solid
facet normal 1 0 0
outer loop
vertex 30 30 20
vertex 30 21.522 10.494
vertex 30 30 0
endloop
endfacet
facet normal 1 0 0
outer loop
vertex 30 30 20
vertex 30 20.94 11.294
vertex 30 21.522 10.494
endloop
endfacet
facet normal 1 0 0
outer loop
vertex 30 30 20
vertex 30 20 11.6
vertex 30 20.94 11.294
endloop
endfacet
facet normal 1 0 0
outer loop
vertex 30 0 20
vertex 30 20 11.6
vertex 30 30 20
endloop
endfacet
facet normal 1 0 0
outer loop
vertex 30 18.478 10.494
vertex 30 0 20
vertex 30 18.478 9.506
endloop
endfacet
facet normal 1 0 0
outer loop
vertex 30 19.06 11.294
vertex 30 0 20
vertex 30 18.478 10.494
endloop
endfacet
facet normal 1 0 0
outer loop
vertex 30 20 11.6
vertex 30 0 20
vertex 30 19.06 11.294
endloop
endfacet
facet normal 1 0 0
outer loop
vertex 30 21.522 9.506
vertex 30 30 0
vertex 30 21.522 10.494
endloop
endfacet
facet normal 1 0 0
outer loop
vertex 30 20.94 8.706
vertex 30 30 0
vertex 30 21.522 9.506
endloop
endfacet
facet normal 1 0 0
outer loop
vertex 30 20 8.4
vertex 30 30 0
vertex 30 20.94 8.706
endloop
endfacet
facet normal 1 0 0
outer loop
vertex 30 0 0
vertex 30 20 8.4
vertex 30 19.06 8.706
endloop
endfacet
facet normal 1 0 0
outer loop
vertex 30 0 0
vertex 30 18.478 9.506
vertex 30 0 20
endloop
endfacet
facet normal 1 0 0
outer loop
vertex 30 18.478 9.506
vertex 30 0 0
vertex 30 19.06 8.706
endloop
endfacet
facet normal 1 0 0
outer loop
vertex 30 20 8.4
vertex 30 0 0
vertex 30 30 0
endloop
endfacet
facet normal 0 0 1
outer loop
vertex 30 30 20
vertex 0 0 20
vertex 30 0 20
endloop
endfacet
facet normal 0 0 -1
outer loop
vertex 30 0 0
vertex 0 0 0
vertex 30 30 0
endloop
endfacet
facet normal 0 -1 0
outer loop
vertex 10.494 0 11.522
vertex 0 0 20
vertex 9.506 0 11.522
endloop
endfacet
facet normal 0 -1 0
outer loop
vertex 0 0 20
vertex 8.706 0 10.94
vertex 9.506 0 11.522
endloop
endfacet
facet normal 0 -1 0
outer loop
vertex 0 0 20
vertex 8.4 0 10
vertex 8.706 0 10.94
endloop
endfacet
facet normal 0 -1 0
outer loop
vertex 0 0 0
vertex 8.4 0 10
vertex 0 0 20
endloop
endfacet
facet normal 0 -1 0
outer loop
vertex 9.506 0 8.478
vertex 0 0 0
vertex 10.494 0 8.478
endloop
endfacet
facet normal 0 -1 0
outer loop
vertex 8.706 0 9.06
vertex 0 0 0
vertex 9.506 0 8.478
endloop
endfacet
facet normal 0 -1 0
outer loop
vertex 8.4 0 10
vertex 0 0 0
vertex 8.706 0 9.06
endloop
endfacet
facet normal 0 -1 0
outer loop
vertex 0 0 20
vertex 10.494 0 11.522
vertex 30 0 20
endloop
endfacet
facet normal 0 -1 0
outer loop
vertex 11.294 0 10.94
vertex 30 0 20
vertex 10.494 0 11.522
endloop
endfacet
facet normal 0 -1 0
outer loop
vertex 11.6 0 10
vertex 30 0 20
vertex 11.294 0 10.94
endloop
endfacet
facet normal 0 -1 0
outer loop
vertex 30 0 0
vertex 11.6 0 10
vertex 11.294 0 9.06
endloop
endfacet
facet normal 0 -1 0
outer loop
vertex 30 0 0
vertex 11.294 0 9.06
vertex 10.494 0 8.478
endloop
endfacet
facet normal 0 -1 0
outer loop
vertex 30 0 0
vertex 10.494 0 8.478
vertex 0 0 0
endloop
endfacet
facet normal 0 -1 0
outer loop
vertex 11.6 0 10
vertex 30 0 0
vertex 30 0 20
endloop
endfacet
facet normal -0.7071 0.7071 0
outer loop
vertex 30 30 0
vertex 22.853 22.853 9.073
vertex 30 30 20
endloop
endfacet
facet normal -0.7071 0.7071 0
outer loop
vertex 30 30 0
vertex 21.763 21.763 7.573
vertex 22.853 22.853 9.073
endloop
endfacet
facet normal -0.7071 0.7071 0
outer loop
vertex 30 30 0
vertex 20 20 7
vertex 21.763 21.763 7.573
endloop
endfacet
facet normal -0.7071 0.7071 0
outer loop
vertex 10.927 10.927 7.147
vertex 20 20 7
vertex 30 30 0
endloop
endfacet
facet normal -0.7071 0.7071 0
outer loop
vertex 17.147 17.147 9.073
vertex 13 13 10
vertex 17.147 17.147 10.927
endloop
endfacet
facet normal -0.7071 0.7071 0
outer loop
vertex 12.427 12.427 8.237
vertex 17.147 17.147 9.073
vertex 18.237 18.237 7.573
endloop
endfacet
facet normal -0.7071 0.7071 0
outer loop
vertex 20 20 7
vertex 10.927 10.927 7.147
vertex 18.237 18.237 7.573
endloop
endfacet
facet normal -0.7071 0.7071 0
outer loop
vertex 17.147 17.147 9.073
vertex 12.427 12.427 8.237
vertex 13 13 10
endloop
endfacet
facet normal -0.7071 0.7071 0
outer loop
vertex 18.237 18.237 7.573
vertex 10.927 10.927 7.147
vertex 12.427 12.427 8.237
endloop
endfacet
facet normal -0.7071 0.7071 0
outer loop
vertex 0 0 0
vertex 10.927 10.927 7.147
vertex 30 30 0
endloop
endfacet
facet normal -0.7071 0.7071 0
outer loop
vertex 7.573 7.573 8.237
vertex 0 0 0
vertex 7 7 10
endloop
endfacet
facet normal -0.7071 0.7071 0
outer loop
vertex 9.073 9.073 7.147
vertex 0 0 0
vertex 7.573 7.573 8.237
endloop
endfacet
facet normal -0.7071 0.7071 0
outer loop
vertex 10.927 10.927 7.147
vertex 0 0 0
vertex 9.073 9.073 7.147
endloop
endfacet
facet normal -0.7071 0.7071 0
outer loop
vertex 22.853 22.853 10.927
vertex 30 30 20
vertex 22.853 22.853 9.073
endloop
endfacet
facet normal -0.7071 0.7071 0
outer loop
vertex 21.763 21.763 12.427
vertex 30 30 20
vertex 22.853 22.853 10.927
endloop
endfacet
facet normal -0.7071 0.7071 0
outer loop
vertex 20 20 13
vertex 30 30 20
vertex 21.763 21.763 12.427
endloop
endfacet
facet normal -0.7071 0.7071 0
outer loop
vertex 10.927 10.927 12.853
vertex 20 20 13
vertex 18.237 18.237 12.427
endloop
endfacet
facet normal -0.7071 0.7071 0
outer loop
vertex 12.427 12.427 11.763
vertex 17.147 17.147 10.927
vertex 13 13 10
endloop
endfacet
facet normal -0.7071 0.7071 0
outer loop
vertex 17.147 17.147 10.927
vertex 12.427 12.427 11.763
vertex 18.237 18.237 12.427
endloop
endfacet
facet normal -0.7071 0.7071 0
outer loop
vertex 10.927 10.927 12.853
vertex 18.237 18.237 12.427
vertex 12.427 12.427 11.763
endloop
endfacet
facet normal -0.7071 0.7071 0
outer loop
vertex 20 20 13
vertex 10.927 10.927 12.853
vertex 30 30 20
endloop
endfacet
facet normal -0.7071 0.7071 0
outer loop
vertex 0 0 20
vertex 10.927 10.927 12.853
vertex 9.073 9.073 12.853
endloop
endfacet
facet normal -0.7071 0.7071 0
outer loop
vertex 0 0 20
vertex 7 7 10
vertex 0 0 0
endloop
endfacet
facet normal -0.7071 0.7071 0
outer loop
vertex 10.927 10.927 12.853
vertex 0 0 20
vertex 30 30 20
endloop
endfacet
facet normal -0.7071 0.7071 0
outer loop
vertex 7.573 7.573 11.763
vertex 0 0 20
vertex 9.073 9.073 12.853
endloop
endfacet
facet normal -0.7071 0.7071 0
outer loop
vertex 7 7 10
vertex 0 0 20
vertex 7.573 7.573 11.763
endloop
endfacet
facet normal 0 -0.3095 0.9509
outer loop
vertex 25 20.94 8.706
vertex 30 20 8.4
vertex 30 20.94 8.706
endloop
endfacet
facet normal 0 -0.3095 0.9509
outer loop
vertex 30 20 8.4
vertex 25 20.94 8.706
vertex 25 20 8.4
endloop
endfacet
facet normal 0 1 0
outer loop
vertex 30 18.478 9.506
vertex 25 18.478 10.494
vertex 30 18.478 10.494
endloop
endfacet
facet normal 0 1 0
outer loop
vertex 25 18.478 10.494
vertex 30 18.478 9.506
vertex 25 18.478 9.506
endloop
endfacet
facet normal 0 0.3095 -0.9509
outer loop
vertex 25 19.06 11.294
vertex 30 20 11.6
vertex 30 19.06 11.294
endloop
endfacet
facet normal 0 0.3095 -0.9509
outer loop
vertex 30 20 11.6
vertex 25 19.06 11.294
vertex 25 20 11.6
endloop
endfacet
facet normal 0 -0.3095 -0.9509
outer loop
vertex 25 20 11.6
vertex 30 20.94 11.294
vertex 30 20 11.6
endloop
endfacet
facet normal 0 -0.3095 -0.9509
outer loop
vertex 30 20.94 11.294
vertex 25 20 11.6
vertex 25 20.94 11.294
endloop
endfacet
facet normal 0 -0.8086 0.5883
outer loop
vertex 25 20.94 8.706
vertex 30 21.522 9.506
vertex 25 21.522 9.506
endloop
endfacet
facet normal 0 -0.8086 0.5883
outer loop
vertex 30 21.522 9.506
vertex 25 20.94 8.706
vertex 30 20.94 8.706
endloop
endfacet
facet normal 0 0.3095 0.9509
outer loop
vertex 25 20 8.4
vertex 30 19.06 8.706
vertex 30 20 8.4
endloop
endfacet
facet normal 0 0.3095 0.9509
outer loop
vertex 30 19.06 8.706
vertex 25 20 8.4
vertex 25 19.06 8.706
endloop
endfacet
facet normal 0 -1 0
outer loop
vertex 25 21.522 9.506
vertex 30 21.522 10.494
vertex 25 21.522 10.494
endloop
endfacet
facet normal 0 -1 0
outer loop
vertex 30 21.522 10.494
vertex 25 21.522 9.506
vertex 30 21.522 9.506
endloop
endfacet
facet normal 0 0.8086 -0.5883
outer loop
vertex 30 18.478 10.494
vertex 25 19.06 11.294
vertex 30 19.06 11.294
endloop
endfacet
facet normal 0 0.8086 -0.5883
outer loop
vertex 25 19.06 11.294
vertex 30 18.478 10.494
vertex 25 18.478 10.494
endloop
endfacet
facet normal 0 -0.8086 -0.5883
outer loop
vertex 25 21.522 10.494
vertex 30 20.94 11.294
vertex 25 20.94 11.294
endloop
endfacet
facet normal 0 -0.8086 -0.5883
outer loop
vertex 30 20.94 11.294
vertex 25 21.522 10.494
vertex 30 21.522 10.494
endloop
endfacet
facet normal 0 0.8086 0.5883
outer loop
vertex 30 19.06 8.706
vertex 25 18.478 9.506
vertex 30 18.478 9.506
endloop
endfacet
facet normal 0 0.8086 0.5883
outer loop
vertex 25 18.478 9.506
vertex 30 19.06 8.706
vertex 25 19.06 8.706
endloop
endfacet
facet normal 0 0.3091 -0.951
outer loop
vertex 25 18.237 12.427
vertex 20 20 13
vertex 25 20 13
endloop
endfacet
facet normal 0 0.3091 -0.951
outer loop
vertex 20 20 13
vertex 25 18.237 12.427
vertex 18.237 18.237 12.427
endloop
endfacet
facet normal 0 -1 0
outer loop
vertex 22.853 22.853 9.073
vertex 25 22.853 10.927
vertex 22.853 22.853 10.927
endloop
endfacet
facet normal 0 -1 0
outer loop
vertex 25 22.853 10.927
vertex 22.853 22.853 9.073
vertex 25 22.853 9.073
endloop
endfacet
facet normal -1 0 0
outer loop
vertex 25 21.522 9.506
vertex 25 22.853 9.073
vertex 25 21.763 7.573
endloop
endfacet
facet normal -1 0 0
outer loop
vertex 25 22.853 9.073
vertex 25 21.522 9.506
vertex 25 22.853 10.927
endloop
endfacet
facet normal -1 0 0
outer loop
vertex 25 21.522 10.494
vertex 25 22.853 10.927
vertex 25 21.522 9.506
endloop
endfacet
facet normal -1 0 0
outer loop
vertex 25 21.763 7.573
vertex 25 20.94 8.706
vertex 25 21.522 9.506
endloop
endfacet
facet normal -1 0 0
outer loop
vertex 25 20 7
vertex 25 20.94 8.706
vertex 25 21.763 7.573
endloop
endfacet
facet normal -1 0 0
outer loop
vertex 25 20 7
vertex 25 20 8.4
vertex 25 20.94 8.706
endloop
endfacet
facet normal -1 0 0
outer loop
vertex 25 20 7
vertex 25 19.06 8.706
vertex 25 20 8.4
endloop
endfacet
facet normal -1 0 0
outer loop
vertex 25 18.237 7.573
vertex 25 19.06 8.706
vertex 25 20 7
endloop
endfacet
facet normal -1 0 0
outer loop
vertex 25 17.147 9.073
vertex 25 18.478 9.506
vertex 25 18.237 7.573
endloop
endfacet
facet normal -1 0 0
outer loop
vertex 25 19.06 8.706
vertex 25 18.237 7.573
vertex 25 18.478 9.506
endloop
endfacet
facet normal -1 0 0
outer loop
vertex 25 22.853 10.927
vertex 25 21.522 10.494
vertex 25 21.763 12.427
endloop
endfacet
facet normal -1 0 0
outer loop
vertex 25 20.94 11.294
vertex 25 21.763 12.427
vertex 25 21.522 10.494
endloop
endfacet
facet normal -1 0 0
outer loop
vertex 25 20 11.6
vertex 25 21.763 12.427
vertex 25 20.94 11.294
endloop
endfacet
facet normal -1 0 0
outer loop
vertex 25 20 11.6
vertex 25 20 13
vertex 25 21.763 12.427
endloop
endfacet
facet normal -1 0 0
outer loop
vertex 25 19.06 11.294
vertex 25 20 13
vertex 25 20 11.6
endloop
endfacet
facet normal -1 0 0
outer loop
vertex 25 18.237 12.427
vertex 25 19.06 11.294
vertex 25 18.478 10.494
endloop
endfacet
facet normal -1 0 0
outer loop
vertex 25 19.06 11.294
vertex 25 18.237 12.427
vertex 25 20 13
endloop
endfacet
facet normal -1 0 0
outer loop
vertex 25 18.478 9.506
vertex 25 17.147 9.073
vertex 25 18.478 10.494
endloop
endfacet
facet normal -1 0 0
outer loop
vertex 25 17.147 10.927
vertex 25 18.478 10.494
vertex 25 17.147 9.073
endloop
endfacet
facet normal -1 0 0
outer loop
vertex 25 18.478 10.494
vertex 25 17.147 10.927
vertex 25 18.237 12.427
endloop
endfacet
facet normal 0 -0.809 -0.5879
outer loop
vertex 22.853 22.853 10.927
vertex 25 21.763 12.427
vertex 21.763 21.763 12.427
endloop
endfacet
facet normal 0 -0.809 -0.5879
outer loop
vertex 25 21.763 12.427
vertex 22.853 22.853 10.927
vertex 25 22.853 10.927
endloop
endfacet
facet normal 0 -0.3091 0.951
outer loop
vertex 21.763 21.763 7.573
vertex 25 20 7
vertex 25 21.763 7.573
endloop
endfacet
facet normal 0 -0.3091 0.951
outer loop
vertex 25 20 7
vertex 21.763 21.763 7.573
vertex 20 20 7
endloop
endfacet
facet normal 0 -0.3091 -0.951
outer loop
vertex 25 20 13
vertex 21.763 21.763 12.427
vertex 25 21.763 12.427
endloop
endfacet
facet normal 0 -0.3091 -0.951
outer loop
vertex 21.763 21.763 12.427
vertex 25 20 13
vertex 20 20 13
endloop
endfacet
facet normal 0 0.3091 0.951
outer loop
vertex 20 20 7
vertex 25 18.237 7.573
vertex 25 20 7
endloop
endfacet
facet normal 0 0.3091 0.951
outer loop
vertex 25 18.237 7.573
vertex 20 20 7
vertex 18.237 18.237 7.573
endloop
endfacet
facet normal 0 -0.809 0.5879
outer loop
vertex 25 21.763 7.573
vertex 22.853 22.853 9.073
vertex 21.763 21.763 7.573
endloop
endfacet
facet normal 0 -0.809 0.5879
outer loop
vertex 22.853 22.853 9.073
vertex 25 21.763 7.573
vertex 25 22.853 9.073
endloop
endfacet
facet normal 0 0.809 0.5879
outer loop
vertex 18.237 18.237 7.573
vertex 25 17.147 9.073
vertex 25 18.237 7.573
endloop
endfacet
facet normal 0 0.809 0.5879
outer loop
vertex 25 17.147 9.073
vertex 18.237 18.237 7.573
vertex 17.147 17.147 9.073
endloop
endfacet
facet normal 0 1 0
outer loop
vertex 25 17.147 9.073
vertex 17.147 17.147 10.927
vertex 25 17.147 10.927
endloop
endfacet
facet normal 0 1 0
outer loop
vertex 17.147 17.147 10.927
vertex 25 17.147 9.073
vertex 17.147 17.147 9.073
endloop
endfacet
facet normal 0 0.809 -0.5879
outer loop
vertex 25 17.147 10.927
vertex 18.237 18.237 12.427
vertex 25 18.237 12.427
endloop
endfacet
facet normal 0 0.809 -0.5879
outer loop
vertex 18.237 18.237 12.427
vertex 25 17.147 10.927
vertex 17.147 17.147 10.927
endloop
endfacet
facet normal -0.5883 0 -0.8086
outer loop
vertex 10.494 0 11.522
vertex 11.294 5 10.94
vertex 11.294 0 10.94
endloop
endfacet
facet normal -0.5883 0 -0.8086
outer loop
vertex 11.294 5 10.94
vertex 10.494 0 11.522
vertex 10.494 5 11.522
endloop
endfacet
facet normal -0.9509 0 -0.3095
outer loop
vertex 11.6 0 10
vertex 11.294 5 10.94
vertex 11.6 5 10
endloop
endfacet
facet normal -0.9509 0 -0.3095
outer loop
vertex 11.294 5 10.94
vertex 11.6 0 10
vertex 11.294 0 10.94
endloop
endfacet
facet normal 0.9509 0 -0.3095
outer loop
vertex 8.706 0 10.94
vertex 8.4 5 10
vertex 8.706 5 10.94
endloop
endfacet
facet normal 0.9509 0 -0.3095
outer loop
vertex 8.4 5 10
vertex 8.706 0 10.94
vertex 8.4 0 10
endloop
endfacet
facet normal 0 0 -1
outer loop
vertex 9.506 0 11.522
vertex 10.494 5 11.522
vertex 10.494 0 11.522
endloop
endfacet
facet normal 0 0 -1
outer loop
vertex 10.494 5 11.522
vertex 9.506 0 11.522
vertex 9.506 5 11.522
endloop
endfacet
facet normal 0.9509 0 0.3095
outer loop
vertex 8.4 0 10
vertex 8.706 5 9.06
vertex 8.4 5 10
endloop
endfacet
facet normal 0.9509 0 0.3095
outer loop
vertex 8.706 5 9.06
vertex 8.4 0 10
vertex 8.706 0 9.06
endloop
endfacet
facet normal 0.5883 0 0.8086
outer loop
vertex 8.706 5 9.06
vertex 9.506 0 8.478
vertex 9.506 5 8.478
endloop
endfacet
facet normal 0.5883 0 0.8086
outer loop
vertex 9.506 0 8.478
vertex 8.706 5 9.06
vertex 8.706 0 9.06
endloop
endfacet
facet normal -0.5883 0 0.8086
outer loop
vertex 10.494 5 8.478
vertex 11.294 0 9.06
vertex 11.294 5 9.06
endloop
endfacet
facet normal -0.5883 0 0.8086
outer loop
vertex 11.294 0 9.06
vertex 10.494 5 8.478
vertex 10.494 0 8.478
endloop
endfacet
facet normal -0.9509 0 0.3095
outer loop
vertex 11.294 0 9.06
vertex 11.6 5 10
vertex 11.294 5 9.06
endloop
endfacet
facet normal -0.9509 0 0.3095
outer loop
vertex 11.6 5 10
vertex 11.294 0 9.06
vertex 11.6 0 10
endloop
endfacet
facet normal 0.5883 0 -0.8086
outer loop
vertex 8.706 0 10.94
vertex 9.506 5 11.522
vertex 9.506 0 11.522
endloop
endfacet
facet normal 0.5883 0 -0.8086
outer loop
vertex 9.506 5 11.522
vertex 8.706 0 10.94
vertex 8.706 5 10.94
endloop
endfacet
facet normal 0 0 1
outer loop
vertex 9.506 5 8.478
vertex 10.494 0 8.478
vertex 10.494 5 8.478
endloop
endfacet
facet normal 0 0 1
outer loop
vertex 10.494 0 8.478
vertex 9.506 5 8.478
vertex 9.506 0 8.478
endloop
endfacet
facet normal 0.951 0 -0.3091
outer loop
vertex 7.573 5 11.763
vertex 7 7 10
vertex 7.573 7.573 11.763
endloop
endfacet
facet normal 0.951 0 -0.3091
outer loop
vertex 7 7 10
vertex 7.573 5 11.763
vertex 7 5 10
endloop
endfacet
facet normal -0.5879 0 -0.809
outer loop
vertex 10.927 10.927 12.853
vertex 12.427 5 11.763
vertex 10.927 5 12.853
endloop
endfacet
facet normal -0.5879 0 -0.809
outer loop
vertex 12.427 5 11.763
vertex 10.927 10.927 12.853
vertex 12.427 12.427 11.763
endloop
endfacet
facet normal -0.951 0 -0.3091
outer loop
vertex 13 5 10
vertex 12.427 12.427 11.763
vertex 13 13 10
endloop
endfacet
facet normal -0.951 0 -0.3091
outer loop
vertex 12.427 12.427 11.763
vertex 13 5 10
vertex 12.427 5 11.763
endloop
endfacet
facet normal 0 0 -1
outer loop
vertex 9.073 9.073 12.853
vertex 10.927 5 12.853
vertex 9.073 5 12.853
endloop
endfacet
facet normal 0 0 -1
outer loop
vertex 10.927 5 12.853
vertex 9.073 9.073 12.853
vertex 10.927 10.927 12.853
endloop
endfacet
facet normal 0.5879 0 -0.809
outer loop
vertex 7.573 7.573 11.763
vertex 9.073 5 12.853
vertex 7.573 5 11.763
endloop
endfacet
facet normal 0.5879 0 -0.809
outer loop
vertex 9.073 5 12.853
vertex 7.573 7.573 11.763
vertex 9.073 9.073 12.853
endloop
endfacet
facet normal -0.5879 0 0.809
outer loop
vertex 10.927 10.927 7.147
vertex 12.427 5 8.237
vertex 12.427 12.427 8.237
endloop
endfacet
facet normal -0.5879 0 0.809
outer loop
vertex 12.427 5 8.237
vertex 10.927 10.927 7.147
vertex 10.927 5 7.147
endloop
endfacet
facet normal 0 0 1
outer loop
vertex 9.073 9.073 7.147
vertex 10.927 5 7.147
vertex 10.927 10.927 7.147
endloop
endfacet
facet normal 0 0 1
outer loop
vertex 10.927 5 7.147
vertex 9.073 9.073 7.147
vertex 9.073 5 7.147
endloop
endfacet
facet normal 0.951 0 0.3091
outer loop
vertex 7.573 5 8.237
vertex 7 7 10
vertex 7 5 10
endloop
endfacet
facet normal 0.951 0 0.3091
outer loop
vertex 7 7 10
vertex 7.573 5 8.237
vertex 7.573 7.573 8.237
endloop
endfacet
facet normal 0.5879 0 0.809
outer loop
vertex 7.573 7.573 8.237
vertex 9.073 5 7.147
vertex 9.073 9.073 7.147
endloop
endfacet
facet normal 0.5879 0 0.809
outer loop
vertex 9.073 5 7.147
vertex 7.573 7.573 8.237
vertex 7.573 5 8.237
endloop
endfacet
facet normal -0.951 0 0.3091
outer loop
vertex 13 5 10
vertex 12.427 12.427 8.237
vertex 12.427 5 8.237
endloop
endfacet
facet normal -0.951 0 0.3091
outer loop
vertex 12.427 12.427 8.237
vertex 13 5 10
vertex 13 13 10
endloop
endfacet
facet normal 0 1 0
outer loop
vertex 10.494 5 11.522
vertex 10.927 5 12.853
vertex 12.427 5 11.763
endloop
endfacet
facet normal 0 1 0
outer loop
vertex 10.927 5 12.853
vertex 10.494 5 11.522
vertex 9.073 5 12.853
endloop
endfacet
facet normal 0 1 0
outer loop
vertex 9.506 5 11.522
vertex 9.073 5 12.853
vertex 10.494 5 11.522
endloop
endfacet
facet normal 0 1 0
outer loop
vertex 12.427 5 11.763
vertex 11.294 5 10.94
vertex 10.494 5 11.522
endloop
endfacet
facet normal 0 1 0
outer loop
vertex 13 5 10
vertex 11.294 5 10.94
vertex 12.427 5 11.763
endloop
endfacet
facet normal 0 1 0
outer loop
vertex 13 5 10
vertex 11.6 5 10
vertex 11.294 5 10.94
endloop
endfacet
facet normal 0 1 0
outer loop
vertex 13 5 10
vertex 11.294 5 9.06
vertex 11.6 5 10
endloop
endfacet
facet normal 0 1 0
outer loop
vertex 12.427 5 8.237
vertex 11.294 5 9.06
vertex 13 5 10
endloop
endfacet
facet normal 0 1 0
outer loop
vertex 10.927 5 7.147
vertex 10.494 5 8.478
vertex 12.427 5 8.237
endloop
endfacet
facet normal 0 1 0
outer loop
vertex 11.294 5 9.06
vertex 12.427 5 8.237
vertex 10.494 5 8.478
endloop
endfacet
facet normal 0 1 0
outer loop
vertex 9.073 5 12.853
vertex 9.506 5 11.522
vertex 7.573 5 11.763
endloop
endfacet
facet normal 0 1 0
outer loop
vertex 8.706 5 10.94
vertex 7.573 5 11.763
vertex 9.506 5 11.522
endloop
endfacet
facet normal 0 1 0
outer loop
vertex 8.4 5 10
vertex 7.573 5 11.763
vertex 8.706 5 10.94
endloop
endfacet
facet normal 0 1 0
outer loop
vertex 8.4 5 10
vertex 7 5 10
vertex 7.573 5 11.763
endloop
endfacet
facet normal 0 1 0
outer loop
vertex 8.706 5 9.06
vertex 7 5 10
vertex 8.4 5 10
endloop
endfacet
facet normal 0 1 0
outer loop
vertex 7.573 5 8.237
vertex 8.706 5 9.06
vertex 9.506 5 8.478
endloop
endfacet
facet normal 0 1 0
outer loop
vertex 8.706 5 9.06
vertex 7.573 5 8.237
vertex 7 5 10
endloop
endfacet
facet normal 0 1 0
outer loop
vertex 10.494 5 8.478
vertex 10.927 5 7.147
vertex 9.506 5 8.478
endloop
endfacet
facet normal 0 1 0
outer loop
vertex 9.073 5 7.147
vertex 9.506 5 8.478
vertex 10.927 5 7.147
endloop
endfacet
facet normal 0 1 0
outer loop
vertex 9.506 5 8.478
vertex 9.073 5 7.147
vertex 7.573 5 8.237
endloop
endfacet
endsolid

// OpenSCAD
///////////////////////////////////////////////////////////////////////////////
//                                                                           //
//                       MaduixaCNC - BCN Dynamics                           //
//                                                                           //
///////////////////////////////////////////////////////////////////////////////
//
// File: 2sides-corner-CNC.scad
//
// Authors: Dani Díaz <dani@bcndynamics.com>,
//          Victor Sapena <victor@bcndynamics.com>,
//          Emili Sapena <emili@bcndynamics.com>
//
// Copyright (c) 2015 by the original authors.
//
// This file is part of MaduixaCNC.
// 
// MaduixaCNC is free: you can redistribute it and/or modify
// it under the terms of the GNU General Public License as published by
// the Free Software Foundation, either version 3 of the License, or
// (at your option) any later version.
// 
// MaduixaCNC is distributed in the hope that it will be useful,
// but WITHOUT ANY WARRANTY; without even the implied warranty of
// MERCHANTABILITY or FITNESS FOR A PARTICULAR PURPOSE.  See the
// GNU General Public License for more details.
// 
// You should have received a copy of the GNU General Public License
// along with MaduixaCNC.  If not, see <http://www.gnu.org/licenses/>.
//
// http://bcndynamics.com 
///////////////////////////////////////////////////////////////////////////////

///////////////////////////////////////////////////////////////////////////////
// Main


difference(){
  cube([30,30,20]);
  
  rotate([0,0,45])
    cube([60,30,20]);

  translate([5,20,10])
    rotate([0,90,0])
      cylinder(r=1.6,h=30,$fn=10);

  translate([15,20,10])
    rotate([0,90,0])
      cylinder(r=3,h=10,$fn=10);

  translate([10,20,10])
    rotate([90,0,0])
      cylinder(r=1.6,h=30,$fn=10);

  translate([10,15,10])
    rotate([90,0,0])
      cylinder(r=3,h=10,$fn=10);
}

// The following cylinders avoid warping when 3Dprinting
// Uncomment the following lines to use them
// cylinder(r=3,h=0.6);
// 
// translate([30,0,0])
//   cylinder(r=3,h=0.6);
// 
// translate([30,30,0])
//   cylinder(r=3,h=0.6);
